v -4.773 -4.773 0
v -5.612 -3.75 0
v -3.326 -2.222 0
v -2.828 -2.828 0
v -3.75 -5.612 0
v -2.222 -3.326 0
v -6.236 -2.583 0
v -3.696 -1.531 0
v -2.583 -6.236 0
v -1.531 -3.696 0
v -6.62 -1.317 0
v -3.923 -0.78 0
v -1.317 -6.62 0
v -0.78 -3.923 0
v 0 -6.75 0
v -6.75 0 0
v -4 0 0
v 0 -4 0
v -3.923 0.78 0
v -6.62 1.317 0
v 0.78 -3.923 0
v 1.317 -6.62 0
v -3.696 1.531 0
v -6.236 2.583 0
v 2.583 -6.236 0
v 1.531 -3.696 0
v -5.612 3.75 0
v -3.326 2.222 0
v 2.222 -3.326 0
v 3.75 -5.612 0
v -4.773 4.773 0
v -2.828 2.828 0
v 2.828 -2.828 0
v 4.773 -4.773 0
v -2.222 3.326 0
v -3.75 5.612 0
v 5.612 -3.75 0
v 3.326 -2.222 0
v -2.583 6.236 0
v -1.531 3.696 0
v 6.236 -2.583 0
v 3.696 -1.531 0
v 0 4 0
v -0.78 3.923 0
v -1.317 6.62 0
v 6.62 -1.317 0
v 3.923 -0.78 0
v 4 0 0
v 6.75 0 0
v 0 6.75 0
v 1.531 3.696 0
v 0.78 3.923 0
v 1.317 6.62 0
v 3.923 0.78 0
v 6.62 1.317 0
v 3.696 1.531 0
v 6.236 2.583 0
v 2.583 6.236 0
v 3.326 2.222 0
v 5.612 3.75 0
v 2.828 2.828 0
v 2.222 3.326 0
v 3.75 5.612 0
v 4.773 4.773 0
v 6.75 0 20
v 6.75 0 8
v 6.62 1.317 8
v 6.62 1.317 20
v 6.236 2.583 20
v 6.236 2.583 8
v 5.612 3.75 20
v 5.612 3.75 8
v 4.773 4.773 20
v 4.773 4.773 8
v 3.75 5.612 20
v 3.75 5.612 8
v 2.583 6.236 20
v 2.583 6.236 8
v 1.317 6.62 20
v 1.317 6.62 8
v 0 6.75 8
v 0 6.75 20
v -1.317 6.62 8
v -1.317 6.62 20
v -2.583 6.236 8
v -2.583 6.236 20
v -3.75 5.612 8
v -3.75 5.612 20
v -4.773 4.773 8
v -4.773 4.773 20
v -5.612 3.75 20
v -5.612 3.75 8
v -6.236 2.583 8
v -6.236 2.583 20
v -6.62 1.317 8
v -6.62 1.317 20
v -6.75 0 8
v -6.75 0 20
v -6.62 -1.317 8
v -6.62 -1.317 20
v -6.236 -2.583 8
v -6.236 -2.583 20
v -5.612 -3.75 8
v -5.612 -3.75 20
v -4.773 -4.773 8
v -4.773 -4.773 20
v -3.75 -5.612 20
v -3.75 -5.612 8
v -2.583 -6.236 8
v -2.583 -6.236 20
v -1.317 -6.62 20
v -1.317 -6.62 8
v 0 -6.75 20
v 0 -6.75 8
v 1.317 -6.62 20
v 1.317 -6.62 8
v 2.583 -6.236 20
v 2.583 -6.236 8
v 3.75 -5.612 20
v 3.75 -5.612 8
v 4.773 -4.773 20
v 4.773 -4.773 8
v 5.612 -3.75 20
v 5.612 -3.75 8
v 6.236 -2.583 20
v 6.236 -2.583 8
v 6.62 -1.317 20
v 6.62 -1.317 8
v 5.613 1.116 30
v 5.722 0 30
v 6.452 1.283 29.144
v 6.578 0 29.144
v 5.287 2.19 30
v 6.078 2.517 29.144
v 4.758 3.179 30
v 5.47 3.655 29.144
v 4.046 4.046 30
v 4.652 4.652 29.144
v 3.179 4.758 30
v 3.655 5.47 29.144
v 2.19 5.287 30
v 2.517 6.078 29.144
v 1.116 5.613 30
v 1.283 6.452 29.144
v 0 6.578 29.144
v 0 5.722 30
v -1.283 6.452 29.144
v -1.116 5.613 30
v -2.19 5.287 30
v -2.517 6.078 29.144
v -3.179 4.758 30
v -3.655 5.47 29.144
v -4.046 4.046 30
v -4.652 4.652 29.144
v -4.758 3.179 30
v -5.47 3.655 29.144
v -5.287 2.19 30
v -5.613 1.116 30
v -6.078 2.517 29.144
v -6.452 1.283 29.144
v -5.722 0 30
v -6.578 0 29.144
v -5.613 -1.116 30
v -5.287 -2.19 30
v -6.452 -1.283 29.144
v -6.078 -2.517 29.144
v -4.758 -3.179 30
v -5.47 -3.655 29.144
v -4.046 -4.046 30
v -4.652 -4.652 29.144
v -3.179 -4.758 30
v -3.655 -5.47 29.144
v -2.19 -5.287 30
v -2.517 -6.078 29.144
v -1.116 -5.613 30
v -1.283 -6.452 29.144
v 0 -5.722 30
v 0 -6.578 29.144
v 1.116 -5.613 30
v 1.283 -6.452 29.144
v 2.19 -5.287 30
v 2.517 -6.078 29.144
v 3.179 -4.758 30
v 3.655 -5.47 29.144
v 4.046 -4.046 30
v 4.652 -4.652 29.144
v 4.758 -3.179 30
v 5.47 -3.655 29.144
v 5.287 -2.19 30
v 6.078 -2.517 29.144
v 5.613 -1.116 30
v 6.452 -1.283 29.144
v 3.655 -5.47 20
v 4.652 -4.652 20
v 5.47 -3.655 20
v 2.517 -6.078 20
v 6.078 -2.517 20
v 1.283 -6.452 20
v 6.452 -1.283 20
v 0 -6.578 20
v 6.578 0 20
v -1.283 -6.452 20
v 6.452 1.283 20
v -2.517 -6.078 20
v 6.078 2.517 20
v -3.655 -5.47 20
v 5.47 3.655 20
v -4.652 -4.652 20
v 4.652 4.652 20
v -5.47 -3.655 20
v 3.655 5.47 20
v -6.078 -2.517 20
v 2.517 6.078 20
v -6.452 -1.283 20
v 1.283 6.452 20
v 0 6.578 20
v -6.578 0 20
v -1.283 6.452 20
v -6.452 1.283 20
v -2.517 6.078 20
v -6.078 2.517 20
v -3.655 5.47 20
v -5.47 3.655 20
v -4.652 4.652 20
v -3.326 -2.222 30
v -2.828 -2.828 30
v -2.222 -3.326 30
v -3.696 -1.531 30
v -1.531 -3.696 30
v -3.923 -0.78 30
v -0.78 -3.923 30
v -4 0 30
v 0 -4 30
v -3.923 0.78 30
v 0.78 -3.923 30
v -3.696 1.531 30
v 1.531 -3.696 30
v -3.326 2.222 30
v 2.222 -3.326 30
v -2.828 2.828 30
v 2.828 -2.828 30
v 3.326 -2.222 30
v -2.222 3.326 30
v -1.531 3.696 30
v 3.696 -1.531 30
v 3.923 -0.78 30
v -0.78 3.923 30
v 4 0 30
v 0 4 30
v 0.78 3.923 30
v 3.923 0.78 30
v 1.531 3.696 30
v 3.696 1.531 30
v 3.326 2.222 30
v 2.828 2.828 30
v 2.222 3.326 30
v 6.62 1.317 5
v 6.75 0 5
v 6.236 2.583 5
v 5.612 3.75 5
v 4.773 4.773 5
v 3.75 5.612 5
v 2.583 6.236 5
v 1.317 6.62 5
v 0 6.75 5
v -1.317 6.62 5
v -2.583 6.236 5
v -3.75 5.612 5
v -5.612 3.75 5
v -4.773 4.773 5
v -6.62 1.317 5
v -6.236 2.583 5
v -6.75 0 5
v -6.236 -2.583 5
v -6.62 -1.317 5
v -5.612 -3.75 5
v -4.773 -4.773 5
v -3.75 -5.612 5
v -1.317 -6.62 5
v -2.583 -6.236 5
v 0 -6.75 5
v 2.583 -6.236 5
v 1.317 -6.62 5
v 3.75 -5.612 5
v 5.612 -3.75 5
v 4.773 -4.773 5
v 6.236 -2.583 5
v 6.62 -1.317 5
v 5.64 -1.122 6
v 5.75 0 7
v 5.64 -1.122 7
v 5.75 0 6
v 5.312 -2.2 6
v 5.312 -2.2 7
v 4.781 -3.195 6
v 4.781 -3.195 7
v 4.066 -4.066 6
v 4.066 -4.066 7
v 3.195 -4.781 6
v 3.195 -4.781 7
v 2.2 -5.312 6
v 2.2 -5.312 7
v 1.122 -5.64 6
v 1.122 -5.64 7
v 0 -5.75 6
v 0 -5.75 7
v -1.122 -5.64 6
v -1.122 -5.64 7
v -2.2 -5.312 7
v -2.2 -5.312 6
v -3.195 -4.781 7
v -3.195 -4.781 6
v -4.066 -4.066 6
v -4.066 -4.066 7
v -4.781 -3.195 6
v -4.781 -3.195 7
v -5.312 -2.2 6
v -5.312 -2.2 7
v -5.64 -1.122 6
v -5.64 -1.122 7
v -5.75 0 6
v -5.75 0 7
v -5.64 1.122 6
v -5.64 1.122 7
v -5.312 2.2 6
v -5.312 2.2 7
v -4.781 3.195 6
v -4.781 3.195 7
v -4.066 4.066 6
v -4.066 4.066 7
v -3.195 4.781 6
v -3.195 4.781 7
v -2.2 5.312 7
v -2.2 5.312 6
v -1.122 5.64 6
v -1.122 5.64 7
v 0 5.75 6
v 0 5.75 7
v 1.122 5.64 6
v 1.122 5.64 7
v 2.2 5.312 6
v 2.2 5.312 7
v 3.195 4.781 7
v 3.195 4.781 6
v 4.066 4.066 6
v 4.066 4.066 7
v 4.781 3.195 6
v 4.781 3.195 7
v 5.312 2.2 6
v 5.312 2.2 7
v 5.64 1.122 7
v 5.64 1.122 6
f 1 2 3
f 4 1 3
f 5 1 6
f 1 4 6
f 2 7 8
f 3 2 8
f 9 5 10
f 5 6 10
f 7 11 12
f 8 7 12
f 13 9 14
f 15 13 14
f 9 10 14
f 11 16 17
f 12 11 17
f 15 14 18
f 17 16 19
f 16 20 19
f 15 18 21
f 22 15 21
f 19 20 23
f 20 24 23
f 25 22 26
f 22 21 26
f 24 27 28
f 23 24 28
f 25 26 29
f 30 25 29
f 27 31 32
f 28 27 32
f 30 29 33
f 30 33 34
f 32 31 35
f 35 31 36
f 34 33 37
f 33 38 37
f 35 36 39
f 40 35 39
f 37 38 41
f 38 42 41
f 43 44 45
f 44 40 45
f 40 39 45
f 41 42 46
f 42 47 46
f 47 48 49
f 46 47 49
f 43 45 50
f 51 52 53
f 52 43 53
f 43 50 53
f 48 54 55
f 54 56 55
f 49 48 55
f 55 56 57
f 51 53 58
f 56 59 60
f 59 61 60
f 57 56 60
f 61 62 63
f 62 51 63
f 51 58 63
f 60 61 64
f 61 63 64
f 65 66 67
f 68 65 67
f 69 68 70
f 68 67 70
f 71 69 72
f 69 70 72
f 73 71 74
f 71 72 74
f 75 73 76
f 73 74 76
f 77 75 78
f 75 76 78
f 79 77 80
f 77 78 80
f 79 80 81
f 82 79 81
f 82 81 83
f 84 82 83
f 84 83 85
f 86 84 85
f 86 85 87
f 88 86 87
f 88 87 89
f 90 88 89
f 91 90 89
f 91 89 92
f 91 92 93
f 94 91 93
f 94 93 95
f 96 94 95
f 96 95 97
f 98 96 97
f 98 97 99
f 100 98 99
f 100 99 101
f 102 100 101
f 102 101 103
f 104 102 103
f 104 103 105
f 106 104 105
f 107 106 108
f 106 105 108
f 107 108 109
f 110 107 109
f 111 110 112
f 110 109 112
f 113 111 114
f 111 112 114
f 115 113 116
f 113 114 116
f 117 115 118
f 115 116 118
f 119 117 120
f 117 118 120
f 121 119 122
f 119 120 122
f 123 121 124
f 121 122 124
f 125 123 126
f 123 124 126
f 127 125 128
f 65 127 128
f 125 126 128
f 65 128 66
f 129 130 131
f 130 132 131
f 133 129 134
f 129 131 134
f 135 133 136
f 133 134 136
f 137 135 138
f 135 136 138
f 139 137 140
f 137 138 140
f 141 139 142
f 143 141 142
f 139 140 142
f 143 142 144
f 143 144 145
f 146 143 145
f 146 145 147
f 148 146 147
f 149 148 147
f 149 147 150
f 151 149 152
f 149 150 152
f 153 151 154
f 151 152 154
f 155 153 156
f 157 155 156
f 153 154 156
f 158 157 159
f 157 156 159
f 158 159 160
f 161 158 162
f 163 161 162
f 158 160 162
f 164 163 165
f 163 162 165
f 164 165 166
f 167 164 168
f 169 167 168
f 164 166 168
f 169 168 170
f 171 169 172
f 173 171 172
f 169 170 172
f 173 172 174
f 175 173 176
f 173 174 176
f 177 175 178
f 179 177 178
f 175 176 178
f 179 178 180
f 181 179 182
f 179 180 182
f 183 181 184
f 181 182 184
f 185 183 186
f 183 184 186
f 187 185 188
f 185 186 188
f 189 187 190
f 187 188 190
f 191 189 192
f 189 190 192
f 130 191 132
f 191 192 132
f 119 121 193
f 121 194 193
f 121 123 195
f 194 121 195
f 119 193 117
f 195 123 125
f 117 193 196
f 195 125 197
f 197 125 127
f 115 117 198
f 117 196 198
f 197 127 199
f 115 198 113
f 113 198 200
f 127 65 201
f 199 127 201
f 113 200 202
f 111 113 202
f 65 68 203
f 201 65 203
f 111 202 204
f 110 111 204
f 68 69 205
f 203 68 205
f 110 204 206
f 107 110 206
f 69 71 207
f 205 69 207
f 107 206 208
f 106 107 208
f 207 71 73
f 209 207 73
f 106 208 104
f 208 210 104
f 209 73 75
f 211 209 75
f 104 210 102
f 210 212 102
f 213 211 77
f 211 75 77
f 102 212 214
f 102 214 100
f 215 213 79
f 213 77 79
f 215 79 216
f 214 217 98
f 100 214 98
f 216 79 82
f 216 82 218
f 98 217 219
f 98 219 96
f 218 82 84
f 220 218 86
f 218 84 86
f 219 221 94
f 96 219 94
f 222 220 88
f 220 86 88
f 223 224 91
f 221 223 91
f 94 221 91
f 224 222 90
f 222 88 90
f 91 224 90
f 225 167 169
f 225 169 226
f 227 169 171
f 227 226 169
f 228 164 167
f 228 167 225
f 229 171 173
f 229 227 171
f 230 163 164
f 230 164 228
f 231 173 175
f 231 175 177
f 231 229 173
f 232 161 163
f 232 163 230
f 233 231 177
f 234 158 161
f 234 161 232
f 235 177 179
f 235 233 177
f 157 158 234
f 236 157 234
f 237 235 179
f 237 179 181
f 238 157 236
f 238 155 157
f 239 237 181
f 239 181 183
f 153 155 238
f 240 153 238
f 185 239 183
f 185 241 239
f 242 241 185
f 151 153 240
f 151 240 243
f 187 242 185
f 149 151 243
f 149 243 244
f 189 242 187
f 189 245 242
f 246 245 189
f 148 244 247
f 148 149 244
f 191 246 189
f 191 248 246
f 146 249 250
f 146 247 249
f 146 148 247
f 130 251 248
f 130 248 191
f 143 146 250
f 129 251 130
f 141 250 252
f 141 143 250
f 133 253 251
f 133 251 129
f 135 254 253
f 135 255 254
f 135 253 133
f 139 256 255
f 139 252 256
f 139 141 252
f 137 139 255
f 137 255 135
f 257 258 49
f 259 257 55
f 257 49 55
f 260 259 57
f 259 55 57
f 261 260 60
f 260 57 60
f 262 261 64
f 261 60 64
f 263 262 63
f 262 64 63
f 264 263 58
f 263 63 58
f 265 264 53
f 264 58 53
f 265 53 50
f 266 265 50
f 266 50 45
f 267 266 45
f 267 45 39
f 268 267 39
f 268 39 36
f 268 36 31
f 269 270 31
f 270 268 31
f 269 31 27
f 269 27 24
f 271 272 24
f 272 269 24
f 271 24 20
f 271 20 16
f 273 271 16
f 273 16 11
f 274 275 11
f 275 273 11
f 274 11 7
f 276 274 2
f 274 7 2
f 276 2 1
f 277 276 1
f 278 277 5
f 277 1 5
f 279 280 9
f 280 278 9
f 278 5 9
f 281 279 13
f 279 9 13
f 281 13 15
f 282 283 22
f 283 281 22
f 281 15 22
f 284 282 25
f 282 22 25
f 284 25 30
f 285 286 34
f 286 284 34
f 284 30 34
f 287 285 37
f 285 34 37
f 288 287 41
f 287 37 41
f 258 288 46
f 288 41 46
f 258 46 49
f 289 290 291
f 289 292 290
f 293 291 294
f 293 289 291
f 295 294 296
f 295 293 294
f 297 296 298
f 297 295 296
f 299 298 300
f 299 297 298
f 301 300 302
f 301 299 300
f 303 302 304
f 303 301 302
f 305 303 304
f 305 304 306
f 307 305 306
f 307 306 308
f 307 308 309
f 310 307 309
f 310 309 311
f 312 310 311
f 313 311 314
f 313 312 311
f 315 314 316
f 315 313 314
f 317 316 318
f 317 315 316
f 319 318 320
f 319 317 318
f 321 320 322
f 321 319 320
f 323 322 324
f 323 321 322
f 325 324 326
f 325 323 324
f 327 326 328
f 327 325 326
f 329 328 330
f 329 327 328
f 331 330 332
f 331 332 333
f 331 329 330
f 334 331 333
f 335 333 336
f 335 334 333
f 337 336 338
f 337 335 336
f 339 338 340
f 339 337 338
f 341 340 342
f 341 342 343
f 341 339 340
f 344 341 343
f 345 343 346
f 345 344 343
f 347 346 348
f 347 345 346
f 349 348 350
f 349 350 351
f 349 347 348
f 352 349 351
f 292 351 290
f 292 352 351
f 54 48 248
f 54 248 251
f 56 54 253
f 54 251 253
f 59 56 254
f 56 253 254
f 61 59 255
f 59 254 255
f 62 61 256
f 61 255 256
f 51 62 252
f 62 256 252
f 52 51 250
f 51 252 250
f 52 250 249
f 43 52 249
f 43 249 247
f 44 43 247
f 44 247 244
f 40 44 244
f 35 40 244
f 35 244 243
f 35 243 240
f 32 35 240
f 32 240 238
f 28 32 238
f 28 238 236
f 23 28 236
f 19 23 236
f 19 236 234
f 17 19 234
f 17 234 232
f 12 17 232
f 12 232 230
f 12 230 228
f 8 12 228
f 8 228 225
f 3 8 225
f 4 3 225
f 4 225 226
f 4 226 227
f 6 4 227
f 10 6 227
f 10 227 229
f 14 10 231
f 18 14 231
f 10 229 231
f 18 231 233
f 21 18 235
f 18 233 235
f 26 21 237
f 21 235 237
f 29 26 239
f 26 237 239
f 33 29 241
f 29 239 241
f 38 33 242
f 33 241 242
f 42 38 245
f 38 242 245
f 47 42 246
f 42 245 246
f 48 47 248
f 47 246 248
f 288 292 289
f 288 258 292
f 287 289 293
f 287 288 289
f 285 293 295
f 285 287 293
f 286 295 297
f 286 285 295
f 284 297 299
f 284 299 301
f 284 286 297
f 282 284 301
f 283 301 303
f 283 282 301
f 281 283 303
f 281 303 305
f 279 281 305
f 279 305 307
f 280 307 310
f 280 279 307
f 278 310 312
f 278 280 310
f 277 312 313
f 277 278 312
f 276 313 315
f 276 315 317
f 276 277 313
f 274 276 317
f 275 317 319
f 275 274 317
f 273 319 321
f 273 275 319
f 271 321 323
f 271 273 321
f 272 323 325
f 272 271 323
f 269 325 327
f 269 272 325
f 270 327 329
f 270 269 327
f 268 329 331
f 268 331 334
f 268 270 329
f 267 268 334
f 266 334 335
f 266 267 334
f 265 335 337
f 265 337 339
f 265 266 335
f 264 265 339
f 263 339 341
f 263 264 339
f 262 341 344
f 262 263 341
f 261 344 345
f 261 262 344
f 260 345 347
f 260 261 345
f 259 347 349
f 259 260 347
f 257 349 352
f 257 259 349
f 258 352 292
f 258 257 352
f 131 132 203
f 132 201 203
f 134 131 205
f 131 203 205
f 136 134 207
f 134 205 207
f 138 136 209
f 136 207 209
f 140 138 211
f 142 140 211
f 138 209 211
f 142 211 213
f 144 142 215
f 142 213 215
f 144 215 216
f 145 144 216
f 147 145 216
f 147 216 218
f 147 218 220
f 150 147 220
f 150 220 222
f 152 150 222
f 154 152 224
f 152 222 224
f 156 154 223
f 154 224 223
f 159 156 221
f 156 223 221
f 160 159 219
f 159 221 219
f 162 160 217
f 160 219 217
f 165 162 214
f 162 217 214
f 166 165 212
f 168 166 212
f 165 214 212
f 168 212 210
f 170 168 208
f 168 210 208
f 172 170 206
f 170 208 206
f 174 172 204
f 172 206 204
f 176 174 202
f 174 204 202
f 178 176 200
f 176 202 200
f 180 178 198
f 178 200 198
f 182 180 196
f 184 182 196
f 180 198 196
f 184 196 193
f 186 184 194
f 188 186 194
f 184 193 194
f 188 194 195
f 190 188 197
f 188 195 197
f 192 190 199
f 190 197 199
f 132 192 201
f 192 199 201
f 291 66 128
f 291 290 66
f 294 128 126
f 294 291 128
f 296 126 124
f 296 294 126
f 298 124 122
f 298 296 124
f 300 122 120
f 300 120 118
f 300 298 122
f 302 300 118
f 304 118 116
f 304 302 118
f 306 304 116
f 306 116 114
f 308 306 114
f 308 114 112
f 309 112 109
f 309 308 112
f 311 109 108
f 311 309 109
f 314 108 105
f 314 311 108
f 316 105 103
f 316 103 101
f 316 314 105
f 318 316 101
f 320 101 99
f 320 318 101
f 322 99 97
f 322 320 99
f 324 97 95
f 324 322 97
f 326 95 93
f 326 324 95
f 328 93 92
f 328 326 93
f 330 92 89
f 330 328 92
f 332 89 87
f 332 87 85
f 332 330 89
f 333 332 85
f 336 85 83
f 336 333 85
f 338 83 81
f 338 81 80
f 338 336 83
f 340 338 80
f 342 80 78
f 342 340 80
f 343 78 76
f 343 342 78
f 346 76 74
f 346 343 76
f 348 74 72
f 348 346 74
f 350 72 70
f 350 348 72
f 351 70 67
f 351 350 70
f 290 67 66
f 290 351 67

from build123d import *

# Parameters (mm, degrees)
SKETCH_1_R          = 6.75
EXTRUDE_1_DEPTH     = 30
SKETCH_3_R          = 4
CUT_EXTRUDE_1_DEPTH = 32.482137793


# Read off the part's stored shape, not the designer's step: G1/4 直管螺纹 螺柱1
with BuildPart() as part:
    # 草图1 → 凸台-拉伸1 (new body)
    with BuildSketch(Plane.XY):
        Circle(SKETCH_1_R)
    extrude(amount=EXTRUDE_1_DEPTH)

    # 草图2 → 切除-旋转1 (revolve, cut)
    with BuildSketch(Plane(origin=(0, 0, 0), x_dir=(0, 0, -1), z_dir=(1, 0, 0)), mode=Mode.PRIVATE) as cut_revolve_1_sk:
        Polygon((-8, 6.75), (-7, 5.75), (-6, 5.75), (-5, 6.75), align=None)
    revolve(cut_revolve_1_sk.sketch.rotate(Axis((0, 0, 3.925992106), (0, 0, -1)), 90), axis=Axis((0, 0, 3.925992106), (0, 0, -1)), mode=Mode.SUBTRACT)

    # 草图3 → 切除-拉伸1 (cut, through all)
    with BuildSketch(Plane.XY.offset(30)):
        Circle(SKETCH_3_R)
    extrude(amount=-CUT_EXTRUDE_1_DEPTH, mode=Mode.SUBTRACT)

    # G1/4 直管螺纹 螺柱1 outline → G1/4 直管螺纹 螺柱1 (revolve, cut)
    with BuildSketch(Plane.XZ):
        Polygon((6.75, 30), (5.7225, 30), (6.5785, 29.144), (6.5785, 20), (6.75, 20), align=None)
    revolve(axis=Axis((0, 0, 0), (0, 0, 1)), mode=Mode.SUBTRACT)


solid = part.part
